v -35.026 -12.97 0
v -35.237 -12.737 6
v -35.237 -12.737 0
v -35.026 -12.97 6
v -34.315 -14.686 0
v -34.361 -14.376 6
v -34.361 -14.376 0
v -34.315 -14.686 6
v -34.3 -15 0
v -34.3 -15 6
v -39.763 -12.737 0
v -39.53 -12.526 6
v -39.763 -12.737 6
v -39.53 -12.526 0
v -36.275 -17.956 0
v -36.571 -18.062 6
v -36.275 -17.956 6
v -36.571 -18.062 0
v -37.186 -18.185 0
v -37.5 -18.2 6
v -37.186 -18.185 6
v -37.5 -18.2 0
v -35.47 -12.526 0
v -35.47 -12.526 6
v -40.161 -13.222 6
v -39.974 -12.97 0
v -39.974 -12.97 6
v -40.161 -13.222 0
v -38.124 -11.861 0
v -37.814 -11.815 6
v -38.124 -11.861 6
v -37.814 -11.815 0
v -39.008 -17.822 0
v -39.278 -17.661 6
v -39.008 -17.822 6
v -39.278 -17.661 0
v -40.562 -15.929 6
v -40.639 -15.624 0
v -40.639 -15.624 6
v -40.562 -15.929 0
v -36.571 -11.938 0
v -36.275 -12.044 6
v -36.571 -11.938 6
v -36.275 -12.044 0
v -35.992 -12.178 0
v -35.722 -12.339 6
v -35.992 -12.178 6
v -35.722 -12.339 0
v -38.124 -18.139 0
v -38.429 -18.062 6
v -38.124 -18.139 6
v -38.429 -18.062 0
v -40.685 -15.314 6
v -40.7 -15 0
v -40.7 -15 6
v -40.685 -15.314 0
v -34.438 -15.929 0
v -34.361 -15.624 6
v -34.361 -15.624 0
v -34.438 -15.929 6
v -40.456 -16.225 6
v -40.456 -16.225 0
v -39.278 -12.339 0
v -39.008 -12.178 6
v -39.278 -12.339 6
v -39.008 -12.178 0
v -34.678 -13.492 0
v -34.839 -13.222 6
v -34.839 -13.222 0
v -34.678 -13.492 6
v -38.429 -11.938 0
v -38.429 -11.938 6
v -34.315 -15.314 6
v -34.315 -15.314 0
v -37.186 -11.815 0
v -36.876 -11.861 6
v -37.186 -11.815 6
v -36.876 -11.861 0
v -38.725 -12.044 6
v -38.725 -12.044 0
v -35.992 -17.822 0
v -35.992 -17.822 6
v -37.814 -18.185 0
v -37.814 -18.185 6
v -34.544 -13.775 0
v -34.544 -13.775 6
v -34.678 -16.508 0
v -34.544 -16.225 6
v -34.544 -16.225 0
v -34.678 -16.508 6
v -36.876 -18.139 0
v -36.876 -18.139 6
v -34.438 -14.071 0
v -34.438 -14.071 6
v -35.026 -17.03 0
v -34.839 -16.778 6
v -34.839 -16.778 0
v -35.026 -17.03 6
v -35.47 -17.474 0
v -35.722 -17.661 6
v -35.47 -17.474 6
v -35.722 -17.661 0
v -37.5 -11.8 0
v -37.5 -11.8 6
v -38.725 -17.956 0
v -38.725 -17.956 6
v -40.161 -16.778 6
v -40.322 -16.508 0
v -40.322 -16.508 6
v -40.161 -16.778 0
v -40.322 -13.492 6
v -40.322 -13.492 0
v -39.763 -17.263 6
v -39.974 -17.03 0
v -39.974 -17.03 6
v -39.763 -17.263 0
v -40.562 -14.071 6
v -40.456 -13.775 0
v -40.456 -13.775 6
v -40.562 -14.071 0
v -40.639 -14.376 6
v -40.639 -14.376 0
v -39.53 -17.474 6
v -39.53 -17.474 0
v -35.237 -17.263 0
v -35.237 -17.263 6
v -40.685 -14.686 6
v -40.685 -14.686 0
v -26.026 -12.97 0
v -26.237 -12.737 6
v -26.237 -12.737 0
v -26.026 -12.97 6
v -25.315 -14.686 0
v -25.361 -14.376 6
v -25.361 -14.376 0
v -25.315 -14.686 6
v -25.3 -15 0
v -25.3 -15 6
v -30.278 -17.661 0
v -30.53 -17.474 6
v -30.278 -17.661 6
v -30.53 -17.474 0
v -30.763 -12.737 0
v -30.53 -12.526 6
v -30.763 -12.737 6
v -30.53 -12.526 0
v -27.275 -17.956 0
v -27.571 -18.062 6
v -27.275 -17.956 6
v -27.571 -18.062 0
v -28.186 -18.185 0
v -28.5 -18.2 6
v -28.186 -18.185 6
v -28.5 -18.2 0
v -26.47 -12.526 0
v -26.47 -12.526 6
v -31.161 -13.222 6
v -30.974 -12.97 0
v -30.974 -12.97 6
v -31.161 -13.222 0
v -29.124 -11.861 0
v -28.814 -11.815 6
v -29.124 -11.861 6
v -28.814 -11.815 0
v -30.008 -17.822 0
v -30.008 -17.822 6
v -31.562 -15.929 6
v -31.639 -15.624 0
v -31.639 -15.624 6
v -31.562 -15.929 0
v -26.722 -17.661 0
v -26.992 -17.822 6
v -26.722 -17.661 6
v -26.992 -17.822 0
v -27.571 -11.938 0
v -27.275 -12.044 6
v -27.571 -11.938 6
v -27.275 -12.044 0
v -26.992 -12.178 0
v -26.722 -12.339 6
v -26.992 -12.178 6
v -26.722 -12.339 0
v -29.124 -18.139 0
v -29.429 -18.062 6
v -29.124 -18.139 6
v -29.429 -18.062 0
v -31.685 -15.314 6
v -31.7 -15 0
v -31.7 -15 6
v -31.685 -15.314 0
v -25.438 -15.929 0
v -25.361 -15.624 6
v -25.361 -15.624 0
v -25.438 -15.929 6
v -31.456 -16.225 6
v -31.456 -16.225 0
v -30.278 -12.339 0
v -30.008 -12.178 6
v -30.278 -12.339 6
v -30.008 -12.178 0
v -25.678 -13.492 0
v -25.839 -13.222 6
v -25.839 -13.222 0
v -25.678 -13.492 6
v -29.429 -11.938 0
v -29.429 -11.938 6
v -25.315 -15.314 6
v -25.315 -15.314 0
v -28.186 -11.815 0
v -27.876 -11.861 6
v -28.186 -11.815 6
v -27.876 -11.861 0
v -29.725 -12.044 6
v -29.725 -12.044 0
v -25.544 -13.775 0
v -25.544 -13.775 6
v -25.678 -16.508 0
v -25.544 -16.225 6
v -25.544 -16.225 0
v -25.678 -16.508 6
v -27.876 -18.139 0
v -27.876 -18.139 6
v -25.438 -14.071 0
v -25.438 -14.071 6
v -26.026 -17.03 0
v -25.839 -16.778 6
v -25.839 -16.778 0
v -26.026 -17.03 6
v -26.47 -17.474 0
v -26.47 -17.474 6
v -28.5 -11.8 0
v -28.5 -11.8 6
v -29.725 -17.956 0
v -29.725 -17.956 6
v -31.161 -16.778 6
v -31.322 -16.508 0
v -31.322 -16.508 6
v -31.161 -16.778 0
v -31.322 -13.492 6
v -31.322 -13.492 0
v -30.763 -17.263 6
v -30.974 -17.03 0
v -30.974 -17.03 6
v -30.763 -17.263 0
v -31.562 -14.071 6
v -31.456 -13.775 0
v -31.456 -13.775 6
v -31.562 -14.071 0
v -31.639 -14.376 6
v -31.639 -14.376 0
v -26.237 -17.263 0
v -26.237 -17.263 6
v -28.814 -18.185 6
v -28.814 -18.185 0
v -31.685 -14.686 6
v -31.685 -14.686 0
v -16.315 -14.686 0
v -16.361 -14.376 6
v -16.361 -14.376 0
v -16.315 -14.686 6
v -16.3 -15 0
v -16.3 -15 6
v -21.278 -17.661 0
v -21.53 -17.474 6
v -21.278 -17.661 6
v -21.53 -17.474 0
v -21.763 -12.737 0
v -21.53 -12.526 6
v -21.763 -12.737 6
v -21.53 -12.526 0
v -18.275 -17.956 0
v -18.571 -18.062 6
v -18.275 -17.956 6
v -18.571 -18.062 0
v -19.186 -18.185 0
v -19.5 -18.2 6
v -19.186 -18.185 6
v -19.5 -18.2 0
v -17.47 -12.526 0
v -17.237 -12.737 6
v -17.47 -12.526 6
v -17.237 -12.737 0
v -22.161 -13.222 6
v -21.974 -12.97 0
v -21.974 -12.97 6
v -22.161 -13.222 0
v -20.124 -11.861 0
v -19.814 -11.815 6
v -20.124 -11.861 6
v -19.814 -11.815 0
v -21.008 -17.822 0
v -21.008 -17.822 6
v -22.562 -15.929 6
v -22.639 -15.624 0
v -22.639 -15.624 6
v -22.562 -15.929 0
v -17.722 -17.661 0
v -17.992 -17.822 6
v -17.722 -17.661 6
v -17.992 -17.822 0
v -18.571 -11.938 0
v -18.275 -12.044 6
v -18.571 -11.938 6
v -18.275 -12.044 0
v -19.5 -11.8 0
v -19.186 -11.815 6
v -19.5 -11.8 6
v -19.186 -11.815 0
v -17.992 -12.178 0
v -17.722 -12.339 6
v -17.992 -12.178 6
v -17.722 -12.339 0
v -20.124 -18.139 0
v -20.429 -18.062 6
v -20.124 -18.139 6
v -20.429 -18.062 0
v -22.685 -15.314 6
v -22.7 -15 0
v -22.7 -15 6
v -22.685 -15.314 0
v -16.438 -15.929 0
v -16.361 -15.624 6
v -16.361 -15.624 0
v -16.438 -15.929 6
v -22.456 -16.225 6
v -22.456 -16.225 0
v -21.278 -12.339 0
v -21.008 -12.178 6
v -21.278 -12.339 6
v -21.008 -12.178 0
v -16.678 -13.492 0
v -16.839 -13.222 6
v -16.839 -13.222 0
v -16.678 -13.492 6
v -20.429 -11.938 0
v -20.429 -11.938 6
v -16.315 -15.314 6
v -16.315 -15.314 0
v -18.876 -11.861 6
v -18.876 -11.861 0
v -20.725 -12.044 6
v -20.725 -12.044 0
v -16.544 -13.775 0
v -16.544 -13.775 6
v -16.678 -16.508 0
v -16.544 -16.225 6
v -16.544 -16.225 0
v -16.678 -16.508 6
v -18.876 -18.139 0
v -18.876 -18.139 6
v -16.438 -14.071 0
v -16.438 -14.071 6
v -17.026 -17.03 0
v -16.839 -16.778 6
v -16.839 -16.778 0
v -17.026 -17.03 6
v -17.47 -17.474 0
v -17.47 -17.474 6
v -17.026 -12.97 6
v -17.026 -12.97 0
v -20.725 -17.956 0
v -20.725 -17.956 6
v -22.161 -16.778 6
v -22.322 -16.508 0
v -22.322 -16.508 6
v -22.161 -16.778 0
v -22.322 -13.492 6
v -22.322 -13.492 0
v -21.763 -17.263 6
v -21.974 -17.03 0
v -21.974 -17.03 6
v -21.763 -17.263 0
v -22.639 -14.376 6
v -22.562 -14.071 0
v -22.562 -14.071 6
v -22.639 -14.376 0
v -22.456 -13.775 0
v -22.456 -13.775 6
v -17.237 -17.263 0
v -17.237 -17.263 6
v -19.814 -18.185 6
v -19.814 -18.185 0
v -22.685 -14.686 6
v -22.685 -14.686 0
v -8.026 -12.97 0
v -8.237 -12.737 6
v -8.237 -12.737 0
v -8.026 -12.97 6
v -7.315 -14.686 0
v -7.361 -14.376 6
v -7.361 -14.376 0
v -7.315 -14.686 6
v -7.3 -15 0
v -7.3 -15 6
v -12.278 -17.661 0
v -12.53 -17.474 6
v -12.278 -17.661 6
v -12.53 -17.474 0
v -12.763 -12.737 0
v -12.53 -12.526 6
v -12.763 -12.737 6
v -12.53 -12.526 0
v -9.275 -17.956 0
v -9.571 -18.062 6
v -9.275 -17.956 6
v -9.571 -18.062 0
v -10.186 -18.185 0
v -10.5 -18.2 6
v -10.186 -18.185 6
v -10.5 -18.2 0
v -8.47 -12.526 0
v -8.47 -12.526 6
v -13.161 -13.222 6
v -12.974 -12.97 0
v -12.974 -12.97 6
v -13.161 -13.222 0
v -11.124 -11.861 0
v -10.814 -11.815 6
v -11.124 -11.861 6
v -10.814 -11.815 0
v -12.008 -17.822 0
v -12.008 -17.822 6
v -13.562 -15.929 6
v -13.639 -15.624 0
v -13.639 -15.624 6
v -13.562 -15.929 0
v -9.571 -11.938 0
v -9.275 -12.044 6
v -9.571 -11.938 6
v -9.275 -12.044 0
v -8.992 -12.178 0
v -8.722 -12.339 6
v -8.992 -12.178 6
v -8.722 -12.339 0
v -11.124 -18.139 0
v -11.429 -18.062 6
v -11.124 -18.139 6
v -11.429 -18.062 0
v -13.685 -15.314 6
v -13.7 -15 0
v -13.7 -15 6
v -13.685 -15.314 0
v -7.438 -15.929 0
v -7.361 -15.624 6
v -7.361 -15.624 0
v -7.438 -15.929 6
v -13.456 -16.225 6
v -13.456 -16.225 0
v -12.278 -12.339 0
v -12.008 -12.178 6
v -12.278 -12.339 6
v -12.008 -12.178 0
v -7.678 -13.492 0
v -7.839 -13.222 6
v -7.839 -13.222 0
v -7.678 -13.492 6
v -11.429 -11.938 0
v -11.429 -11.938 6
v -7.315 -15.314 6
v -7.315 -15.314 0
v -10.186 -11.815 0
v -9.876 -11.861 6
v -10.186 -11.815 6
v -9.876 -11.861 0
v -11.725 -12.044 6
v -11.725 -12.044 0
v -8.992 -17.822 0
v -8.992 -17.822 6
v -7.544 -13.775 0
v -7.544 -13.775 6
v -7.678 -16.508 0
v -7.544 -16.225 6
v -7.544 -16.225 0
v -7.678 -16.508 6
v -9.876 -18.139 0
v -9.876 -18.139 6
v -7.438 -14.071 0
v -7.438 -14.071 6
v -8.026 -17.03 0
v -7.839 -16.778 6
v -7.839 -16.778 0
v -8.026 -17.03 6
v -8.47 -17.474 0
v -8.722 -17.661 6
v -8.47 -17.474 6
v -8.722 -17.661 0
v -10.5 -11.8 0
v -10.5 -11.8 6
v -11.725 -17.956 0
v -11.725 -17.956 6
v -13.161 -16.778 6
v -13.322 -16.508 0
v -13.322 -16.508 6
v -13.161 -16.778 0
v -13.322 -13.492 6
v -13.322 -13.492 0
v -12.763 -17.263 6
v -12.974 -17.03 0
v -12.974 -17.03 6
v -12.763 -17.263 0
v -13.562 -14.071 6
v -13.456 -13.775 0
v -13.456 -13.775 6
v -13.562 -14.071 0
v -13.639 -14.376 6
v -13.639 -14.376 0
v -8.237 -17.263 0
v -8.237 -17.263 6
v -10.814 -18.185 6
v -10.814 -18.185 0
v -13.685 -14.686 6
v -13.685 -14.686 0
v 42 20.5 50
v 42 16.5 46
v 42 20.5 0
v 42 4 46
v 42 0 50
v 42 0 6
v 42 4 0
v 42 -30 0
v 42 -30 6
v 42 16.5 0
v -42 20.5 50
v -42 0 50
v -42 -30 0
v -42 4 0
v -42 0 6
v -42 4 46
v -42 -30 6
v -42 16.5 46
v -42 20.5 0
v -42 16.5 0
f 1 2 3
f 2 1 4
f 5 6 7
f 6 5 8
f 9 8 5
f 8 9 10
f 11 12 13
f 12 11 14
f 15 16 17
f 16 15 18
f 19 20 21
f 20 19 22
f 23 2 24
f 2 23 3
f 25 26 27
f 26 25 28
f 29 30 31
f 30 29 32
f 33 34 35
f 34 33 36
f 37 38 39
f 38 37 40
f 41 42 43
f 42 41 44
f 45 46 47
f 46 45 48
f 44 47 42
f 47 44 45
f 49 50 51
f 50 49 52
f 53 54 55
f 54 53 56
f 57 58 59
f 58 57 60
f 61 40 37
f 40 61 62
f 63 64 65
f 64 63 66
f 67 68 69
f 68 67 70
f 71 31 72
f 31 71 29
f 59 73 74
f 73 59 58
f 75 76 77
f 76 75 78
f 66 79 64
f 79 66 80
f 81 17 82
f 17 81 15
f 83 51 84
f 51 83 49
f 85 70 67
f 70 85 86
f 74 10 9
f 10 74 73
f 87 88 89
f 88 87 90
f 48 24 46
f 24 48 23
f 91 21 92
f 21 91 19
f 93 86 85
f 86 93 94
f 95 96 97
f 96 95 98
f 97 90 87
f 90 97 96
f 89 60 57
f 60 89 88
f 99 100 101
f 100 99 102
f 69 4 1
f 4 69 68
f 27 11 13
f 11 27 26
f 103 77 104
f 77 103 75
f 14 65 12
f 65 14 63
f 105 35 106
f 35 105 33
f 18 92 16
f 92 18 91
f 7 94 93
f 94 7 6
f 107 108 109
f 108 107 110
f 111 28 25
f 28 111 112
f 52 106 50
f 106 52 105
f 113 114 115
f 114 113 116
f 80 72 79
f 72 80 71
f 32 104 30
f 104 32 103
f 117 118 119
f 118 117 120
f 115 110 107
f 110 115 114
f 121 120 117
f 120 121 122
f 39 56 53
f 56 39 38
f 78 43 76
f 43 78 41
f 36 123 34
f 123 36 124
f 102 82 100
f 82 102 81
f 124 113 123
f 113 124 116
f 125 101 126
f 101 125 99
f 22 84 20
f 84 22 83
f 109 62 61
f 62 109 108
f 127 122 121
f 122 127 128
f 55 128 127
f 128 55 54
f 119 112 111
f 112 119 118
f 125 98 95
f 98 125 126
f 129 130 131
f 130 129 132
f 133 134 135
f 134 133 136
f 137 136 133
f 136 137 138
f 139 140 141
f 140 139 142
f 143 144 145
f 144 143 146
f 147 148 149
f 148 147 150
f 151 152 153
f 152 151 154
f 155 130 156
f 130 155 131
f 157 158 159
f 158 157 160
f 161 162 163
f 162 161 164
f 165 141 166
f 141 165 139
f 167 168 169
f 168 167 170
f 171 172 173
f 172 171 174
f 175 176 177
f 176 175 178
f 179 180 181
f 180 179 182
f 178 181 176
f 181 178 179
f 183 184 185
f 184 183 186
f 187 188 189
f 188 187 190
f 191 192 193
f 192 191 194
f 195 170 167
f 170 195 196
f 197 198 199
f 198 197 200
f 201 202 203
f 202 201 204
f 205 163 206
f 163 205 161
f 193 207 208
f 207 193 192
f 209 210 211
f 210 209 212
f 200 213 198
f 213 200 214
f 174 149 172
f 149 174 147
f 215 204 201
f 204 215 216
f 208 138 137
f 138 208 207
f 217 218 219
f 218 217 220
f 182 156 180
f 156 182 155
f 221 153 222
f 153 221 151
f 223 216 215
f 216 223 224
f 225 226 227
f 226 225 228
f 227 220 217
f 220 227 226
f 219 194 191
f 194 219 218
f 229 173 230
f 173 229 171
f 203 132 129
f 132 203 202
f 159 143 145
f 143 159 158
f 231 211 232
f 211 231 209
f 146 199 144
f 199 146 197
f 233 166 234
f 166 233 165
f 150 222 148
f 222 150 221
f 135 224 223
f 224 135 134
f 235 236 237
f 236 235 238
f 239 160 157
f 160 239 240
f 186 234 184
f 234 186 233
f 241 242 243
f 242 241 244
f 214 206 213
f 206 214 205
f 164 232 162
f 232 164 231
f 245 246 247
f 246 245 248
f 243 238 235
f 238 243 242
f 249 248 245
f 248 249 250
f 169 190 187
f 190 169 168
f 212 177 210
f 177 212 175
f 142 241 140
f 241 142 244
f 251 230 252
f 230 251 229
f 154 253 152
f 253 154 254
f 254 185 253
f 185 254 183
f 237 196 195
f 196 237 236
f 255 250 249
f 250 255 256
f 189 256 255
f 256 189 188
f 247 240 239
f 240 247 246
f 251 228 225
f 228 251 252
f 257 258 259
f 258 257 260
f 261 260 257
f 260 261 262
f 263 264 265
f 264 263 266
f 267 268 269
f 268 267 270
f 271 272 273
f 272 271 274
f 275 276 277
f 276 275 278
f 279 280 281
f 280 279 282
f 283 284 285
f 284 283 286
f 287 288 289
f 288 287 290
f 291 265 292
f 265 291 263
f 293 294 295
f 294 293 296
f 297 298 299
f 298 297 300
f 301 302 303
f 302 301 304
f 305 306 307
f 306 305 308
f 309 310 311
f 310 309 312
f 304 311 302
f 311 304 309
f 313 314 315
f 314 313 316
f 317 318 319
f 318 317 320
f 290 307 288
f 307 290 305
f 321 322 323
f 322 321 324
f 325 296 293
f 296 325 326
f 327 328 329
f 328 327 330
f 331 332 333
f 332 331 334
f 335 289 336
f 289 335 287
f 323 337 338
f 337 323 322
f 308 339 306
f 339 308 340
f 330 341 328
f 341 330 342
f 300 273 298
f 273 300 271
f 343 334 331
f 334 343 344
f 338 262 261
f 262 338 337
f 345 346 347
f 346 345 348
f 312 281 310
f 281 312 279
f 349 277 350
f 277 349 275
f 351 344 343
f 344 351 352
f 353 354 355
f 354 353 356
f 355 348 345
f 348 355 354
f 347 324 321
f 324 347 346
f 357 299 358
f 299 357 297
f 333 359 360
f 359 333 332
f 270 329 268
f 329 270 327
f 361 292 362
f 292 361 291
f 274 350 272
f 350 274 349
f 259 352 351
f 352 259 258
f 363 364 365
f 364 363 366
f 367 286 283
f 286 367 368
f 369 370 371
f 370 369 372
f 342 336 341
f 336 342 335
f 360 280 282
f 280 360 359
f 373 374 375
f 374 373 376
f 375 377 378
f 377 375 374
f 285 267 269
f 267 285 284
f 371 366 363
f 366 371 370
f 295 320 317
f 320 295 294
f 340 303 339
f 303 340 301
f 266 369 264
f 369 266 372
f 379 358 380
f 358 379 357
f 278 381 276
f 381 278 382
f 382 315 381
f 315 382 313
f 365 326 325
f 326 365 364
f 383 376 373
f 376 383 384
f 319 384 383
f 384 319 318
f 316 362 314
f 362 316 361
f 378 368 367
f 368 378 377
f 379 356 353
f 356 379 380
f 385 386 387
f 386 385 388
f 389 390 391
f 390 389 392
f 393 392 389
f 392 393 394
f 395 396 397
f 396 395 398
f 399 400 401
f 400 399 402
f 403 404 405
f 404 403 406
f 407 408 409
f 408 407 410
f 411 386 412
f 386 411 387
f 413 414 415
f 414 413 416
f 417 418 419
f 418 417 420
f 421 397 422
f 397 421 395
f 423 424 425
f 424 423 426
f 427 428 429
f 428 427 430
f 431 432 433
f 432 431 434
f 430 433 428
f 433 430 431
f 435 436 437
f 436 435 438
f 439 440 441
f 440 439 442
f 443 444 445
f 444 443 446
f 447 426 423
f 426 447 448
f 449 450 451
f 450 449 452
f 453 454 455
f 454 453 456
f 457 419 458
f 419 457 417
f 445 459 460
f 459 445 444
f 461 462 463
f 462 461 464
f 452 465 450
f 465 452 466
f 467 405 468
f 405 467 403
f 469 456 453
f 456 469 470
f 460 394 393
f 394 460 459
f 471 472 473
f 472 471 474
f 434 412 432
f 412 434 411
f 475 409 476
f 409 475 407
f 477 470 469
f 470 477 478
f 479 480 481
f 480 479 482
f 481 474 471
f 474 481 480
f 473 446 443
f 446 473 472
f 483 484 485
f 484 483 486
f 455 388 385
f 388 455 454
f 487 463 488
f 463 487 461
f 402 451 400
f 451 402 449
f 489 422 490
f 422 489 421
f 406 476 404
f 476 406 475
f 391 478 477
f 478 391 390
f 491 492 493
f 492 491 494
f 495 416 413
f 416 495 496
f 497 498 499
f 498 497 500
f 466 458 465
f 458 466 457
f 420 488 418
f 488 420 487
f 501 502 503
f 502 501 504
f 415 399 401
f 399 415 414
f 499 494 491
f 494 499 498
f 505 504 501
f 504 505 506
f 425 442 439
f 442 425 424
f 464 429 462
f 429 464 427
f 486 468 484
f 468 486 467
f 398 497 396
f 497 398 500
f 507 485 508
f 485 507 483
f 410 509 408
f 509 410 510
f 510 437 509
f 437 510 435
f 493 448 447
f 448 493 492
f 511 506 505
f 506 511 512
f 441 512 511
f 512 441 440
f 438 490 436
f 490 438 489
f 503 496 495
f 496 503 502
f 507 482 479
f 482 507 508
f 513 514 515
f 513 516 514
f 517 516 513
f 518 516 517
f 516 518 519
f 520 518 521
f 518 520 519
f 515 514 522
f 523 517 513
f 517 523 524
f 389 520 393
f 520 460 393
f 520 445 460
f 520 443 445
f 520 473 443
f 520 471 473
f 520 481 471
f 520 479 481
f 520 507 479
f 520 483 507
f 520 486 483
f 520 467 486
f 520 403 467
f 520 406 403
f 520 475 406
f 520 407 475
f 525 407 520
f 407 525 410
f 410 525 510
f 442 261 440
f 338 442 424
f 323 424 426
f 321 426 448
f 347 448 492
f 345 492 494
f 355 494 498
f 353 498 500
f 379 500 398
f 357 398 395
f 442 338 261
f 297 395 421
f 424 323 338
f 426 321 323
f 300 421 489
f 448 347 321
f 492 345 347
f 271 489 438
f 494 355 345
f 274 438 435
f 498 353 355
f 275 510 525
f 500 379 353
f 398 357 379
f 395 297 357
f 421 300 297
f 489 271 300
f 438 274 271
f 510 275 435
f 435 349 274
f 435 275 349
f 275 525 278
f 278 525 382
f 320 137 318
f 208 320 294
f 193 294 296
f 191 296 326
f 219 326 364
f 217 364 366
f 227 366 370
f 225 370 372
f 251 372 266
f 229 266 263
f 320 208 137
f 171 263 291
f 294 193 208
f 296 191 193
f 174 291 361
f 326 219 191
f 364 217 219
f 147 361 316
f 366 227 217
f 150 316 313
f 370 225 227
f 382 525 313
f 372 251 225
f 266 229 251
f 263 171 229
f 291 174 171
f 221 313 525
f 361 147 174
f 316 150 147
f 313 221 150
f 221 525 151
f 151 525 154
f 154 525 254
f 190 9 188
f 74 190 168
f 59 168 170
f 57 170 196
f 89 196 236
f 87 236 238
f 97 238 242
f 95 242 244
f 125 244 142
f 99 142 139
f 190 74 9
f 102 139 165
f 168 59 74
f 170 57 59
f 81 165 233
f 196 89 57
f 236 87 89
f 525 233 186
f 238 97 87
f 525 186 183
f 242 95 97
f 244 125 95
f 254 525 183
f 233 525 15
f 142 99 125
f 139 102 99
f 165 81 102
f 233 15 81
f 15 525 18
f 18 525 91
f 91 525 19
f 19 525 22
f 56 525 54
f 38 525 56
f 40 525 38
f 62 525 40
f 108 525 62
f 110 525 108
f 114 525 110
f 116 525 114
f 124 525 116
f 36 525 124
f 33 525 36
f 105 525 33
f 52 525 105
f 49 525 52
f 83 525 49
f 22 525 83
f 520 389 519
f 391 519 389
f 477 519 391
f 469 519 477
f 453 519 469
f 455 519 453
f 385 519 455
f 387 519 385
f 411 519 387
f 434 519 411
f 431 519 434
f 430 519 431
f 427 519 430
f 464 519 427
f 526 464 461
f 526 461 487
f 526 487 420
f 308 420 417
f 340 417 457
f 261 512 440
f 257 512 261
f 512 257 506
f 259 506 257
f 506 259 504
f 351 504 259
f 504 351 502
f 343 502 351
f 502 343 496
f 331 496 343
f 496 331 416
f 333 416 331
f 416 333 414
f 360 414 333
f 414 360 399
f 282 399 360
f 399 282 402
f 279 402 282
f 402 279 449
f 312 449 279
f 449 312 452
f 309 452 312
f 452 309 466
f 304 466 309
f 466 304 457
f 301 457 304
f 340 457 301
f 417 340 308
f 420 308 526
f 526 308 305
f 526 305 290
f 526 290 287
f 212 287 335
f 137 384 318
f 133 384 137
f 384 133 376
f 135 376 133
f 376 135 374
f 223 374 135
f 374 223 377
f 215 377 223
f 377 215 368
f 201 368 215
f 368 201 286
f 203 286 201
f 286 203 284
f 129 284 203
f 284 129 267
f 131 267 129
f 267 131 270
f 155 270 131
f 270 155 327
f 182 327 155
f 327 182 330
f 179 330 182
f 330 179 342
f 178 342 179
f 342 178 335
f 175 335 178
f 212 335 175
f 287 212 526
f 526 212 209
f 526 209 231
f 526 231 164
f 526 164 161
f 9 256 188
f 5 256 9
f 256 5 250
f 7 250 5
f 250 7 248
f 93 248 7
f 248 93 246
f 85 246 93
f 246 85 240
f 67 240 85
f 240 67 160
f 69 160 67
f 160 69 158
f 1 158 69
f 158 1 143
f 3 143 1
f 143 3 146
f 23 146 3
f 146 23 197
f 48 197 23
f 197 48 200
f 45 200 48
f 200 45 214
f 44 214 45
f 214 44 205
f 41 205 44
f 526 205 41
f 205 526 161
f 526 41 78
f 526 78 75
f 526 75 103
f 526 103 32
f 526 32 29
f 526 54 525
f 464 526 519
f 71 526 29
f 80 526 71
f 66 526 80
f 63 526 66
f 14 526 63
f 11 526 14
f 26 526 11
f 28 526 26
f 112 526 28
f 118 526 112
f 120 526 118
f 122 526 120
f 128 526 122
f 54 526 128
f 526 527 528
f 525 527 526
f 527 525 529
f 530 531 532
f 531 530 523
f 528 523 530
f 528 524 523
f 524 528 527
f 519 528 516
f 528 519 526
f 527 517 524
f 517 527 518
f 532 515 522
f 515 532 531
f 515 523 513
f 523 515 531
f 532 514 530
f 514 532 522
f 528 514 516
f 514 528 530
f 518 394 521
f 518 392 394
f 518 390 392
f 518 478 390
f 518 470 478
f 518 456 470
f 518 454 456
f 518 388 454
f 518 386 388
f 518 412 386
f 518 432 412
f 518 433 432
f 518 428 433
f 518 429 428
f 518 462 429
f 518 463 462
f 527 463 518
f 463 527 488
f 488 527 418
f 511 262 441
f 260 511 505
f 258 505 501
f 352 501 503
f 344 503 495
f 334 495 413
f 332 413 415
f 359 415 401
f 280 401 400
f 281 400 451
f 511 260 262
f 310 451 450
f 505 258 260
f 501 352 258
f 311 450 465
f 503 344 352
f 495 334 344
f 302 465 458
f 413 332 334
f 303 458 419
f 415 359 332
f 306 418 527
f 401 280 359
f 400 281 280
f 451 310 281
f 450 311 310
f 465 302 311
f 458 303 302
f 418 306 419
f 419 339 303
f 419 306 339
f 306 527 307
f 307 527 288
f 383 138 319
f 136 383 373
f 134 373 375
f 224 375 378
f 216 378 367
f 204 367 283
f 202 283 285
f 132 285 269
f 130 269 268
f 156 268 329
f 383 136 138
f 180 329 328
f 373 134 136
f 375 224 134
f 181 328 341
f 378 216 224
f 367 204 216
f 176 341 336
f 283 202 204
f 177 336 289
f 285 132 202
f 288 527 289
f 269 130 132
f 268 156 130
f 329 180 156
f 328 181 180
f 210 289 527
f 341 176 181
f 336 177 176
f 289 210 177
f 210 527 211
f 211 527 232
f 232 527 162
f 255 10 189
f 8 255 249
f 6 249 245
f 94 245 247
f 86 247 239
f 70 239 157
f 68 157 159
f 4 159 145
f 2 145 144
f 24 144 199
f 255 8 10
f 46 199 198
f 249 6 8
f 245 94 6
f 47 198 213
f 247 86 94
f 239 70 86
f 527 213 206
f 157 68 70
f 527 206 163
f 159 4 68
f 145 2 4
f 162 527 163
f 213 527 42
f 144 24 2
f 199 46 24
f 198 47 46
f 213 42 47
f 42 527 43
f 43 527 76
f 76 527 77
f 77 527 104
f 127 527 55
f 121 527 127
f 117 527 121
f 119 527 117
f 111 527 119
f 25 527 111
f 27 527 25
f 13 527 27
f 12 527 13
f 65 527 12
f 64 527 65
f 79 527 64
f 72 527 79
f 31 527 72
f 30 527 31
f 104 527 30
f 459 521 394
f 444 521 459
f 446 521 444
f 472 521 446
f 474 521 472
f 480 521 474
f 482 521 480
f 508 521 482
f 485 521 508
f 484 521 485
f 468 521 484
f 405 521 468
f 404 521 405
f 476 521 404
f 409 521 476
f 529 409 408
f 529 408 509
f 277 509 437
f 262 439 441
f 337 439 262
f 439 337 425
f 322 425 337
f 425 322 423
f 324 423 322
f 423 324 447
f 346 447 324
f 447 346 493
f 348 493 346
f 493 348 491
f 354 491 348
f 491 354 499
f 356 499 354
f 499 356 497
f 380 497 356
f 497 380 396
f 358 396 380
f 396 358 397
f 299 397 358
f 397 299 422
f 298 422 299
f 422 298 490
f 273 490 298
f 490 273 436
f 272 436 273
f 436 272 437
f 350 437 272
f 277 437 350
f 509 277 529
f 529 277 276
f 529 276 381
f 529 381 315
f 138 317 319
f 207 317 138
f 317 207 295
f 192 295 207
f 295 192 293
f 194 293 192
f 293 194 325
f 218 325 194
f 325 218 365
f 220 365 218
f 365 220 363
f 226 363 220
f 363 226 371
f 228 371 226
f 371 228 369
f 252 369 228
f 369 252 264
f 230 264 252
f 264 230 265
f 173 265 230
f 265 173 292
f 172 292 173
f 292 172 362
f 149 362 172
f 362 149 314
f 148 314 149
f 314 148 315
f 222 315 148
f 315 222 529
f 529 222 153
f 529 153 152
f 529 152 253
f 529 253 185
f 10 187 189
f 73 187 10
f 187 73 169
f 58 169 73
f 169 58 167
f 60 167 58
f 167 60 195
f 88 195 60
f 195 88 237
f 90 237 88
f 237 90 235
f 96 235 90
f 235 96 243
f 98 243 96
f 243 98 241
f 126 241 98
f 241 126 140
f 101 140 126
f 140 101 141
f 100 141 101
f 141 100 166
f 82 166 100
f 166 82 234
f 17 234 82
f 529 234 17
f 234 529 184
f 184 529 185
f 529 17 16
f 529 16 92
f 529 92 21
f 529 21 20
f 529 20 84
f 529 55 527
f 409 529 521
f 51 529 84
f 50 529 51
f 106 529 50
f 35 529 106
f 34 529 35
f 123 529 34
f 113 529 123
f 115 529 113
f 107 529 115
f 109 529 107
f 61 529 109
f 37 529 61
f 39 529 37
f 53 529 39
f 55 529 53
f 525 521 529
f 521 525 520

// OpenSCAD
// --- Dimensions ---
// Overall extrusion length along X
length_x = 84; 

// Wall thickness gap (user specified 12.5mm gap for 12mm wall)
gap_width = 12.5; 

// Leg dimensions
leg_thickness = 4; // Inner leg: y=0 to 4, Outer leg: y=16.5 to 20.5 (diff is 4)
leg_height = 50;

// Bridge dimensions
bridge_height_start = 46;
bridge_height_end = 50;

// Ledge dimensions
ledge_thickness = 6;
ledge_depth = 30; // From y=0 to y=-30

// Tube hole dimensions
hole_diameter = 6.4;
hole_y_pos = -15;
hole_spacing_x = 9;
num_holes = 8;

// --- Parameters ---
$fn = 64;

// --- Calculations ---
// Calculate X offset to center the 8 holes along the 84mm length
// Total span of holes = (num_holes - 1) * spacing
hole_span = (num_holes - 1) * hole_spacing_x;
x_start = -(hole_span / 2);

// --- Modeling ---

module profile() {
    difference() {
        // Main U-shape body
        union() {
            // Inner Leg
            translate([0, 0, 0])
                cube([leg_thickness, leg_thickness, leg_height]);
            
            // Outer Leg
            translate([0, leg_thickness + gap_width, 0])
                cube([leg_thickness, leg_thickness, leg_height]);
            
            // Top Bridge
            translate([0, 0, bridge_height_start])
                cube([leg_thickness, leg_thickness + gap_width, bridge_height_end - bridge_height_start]);
            
            // Ledge
            translate([0, -ledge_depth, 0])
                cube([leg_thickness, ledge_depth, ledge_thickness]);
        }

        // Subtract holes for the PCR tubes
        // We iterate through X to place 8 holes
        for (i = [0 : num_holes - 1]) {
            translate([x_start + (i * hole_spacing_x), hole_y_pos, -1])
                cylinder(d = hole_diameter, h = ledge_thickness + 2);
        }
    }
}

// Final Assembly
// The profile is extruded 84mm along X, centered on X=0
translate([-length_x/2, 0, 0])
    linear_extrude(height = length_x)
        // We rotate the profile so the extrusion is along X
        // The user wants the profile in YZ plane, extruded along X.
        // In OpenSCAD, linear_extrude goes along Z. 
        // So we define the profile in XY and extrude along Z, 
        // OR define profile in YZ and rotate.
        // Let's define the profile in the YZ plane and rotate it.
        rotate([0, 0, 0]) 
        rotate([0, -90, 0]) // Rotate profile to lie in YZ plane
        profile();

// Note: The logic above uses a trick: 
// 1. Define profile in its local 2D-ish space.
// 2. Rotate it to the YZ plane.
// 3. Linear extrude along X.
// To make it simple for the user, I will rewrite the profile to be 
// defined in the XY plane and then extrude along Z, but the user 
// specifically asked for the profile in YZ and extrusion along X.
// I will follow the user's geometric description exactly.

// RE-WRITING FOR CLARITY AND ACCURACY TO USER REQUEST:
// "A profile in the YZ plane extruded 84 mm along X, centred on x = 0"

module final_part() {
    // We build the profile in the YZ plane (X=0)
    // Then we extrude it along X.
    // To do this in OpenSCAD, we define the shape in XY and extrude Z,
    // then rotate it so the extrusion is along X.
    
    difference() {
        // The main solid body
        union() {
            // Inner Leg (YZ plane)
            translate([0, 0, 0]) cube([0.01, leg_thickness, leg_height]);
            // Outer Leg (YZ plane)
            translate([0, leg_thickness + gap_width, 0]) cube([0.01, leg_thickness, leg_height]);
            // Bridge (YZ plane)
            translate([0, 0, bridge_height_start]) cube([0.01, leg_thickness + gap_width, bridge_height_end - bridge_height_start]);
            // Ledge (YZ plane)
            translate([0, -ledge_depth, 0]) cube([0.01, ledge_depth, ledge_thickness]);
        }
        
        // Holes (Must be subtracted from the extruded volume)
        // Since we are extruding along X, the holes must be cylinders along X
        for (i = [0 : num_holes - 1]) {
            translate([x_start + (i * hole_spacing_x), hole_y_pos, -1])
                cylinder(d = hole_diameter, h = length_x + 2);
        }
    }
}

// Correct implementation:
// 1. Create the 2D profile in the YZ plane.
// 2. Extrude it along X.

module profile_2d_yz() {
    // This is a 2D representation of the YZ profile
    // We use polygon or a series of 2D shapes
    // Since we need to subtract holes, we'll do it in 3D.
}

// Final approach: Build the 3D object in the YZ plane, then extrude along X.
// To extrude along X, we build it in the XY plane and rotate.

module build_3d() {
    difference() {
        union() {
            // Inner Leg (along X, thickness in Y, height in Z)
            translate([0, 0, 0]) cube([length_x, leg_thickness, leg_height]);
            
            // Outer Leg
            translate([0, leg_thickness + gap_width, 0]) cube([length_x, leg_thickness, leg_height]);
            
            // Bridge
            translate([0, 0, bridge_height_start]) cube([length_x, leg_thickness + gap_width, bridge_height_end - bridge_height_start]);
            
            // Ledge
            translate([0, -ledge_depth, 0]) cube([length_x, ledge_depth, ledge_thickness]);
        }
        
        // Holes (Cylinders along Y or Z? User says "vertical 6.4mm through-holes... at y=-15")
        // "Vertical" in a 3D print usually means along Z.
        // "Through-holes" in the ledge (which is 6mm thick) means the hole goes through the thickness.
        // If the ledge is at z=0 to 6, the hole is along Z.
        for (i = [0 : num_holes - 1]) {
            translate([x_start + (i * hole_spacing_x), hole_y_pos, -1])
                cylinder(d = hole_diameter, h = ledge_thickness + 2);
        }
    }
}

// The user wants the part centered on X=0.
// The extrusion is 84mm along X.
// The profile is in YZ.
// This means the X-axis is the extrusion axis.
// To center on X=0, we translate by -length_x/2.

translate([-length_x/2, 0, 0]) build_3d();
